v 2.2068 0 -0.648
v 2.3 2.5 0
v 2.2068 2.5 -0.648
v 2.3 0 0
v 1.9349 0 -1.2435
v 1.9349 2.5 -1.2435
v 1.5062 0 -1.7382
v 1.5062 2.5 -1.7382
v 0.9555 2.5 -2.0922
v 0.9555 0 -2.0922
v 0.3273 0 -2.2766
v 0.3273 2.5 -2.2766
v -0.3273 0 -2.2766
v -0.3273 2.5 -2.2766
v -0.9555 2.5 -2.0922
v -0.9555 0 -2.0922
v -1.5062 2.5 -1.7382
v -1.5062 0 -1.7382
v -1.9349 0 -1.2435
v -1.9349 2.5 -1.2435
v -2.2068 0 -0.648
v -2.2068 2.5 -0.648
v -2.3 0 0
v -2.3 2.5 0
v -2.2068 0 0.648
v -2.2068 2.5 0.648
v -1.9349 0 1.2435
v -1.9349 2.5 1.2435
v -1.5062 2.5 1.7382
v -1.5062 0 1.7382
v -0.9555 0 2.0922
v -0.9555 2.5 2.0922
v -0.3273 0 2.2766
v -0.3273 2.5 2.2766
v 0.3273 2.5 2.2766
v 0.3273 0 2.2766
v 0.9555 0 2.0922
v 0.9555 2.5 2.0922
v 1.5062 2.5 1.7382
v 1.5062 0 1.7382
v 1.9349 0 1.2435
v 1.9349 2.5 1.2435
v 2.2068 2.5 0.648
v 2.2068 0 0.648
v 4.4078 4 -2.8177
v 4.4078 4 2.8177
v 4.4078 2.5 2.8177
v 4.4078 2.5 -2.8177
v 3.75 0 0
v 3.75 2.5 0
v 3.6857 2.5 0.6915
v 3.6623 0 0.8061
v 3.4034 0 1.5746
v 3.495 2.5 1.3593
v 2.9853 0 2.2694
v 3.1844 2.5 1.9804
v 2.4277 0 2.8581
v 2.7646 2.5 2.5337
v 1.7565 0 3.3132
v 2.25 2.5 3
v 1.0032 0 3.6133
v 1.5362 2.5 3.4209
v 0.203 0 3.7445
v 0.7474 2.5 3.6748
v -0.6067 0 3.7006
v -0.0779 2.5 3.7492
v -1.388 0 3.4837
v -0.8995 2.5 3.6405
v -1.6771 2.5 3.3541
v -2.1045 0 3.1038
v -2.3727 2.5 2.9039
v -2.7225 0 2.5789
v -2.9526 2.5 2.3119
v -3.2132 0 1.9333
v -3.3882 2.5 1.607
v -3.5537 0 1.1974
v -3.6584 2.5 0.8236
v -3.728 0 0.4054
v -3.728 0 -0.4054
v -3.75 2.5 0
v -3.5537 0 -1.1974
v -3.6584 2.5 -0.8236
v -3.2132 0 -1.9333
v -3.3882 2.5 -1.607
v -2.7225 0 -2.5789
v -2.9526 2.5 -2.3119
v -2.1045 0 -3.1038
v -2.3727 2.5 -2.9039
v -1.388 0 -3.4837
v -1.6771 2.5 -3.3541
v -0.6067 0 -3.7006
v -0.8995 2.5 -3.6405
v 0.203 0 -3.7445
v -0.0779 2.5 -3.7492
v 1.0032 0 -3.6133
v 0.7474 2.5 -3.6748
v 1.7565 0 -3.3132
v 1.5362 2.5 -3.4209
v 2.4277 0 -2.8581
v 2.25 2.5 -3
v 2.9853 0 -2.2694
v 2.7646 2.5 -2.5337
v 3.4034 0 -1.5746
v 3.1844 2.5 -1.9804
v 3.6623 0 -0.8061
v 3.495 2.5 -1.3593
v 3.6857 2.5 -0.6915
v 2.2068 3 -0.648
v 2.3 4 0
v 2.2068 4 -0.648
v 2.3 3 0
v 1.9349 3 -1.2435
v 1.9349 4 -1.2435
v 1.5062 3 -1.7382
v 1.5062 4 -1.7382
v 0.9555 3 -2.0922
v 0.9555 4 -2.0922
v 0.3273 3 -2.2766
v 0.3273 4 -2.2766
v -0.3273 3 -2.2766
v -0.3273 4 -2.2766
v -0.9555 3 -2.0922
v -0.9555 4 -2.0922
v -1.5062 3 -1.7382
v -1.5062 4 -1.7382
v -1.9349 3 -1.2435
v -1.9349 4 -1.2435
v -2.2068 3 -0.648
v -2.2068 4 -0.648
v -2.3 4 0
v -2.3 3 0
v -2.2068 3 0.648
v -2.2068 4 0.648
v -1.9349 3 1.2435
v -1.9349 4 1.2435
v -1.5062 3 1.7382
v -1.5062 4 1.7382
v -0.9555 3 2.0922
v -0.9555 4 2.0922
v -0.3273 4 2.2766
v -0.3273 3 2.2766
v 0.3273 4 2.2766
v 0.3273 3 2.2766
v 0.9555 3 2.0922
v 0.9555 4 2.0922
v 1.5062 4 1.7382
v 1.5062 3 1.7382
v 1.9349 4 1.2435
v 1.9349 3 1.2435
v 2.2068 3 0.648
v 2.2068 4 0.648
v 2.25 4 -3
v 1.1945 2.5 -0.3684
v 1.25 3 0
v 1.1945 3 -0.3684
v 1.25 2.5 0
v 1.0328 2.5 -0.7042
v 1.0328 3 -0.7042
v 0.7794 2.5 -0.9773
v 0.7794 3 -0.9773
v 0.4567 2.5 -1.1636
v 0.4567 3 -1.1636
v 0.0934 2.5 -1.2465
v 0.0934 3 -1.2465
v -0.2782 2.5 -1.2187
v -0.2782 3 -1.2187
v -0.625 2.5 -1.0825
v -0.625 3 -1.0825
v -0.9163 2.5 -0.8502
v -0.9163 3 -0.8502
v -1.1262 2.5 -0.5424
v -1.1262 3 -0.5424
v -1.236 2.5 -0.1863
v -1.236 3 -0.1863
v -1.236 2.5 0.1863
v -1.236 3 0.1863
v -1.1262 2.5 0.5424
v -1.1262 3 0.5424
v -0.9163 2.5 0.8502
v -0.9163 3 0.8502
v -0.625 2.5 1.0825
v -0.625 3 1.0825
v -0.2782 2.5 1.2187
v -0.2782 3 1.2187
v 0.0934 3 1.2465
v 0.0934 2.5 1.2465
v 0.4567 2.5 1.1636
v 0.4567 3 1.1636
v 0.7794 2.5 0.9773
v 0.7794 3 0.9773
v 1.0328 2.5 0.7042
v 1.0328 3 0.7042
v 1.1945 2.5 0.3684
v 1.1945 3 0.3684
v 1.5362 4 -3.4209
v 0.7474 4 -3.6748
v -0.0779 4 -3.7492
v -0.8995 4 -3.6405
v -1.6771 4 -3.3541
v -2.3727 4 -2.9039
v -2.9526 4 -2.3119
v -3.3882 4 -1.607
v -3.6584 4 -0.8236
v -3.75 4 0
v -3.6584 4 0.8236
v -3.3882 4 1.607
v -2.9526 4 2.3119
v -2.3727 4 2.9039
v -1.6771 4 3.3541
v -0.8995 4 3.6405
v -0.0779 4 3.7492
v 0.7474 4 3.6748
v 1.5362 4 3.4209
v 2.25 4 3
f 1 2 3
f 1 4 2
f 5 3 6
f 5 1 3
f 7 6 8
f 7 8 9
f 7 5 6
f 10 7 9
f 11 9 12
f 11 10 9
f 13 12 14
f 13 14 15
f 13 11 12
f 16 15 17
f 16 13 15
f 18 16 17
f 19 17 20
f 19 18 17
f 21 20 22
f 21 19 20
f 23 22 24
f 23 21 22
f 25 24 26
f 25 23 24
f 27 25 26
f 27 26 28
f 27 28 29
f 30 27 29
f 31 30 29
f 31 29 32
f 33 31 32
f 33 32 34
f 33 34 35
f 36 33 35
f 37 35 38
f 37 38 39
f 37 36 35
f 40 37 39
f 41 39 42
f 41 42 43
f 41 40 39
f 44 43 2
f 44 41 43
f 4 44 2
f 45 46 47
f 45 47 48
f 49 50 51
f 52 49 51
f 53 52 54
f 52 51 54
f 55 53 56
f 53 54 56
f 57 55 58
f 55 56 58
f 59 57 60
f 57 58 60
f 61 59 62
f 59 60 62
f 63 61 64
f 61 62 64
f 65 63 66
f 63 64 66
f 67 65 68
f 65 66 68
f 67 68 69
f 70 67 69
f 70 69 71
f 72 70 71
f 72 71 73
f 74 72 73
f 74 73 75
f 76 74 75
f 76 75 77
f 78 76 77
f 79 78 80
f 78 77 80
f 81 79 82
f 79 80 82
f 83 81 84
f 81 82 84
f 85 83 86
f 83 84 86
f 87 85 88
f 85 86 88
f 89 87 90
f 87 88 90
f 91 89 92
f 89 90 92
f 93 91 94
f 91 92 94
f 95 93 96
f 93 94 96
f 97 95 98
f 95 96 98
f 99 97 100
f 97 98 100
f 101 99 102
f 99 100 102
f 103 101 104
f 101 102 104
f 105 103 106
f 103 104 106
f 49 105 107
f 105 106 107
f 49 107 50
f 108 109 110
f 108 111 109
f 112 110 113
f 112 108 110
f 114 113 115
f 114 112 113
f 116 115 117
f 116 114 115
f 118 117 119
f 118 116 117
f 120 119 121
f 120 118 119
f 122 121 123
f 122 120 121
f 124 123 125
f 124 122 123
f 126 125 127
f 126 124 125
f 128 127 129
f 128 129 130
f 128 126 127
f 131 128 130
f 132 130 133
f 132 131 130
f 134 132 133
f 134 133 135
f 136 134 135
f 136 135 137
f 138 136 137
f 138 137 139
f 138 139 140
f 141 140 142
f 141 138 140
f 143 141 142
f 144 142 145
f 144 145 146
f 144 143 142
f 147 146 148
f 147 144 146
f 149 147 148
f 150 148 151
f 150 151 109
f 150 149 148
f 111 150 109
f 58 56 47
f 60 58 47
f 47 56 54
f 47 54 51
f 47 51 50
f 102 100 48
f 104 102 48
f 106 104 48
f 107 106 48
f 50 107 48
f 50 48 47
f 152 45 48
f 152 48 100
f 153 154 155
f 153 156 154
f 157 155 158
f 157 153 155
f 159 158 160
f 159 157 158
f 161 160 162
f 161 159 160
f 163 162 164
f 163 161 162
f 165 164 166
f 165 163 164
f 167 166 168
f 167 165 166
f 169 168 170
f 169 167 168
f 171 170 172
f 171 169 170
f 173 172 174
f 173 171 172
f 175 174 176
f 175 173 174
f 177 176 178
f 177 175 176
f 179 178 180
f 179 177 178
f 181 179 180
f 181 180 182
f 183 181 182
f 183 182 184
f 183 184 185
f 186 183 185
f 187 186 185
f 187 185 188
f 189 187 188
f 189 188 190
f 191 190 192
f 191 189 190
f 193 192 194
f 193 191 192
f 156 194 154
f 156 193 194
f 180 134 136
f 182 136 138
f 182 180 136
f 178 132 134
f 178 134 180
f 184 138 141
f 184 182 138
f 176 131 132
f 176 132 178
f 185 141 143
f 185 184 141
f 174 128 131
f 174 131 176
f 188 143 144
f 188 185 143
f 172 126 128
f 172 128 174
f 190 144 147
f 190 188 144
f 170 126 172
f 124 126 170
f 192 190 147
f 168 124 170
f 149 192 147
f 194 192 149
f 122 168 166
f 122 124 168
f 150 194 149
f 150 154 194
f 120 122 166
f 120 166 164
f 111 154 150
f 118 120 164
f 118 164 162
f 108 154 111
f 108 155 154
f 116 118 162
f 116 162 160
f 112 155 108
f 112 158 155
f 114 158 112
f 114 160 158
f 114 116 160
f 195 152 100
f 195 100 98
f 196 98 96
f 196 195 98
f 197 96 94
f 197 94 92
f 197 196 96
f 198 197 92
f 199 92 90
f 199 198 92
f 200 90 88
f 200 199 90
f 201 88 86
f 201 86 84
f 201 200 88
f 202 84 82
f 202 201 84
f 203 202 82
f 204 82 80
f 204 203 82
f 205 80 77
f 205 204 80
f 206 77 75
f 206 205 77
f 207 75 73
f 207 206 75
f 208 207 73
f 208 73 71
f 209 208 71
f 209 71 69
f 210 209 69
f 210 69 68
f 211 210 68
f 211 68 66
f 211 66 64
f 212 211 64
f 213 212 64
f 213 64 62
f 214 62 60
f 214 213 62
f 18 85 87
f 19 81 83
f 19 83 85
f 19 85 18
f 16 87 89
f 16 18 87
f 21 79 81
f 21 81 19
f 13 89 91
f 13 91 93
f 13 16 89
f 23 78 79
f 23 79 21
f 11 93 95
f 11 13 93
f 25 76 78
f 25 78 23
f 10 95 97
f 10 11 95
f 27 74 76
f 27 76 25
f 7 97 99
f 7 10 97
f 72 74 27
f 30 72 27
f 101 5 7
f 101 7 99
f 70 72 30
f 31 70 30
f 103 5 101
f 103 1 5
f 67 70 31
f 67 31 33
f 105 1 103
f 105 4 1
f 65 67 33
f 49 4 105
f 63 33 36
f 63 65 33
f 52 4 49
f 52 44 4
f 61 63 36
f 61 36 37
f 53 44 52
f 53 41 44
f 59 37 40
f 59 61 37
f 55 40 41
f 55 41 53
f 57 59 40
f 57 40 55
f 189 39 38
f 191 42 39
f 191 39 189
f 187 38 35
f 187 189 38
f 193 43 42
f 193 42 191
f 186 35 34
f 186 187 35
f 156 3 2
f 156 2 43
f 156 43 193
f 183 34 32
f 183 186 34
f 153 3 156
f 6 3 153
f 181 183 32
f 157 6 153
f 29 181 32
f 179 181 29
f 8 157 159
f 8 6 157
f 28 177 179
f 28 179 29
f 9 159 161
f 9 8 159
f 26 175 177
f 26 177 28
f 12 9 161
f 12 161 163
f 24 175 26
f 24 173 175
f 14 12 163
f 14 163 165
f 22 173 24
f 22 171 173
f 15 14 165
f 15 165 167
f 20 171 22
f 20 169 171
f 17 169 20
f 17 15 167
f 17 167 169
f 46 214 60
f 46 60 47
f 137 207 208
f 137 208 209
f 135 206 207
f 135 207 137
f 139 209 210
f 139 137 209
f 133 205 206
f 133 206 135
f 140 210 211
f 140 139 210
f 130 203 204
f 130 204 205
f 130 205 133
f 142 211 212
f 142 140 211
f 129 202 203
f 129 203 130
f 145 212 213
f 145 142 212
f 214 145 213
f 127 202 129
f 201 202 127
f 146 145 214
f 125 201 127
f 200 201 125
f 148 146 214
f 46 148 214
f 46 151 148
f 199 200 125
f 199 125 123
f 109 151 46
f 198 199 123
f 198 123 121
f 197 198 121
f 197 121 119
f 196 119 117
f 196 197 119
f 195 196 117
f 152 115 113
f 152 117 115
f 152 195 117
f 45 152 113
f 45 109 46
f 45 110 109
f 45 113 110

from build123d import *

# Parameters (mm, degrees)
BOSS_EXTRUDE1_DEPTH = 1.5
SKETCH2_R           = 3.75
BOSS_EXTRUDE2_DEPTH = 2.5


with BuildPart() as part:
    # Sketch1 → Boss-Extrude1 (new body)
    with BuildSketch(Plane(origin=(0, 4, 0), x_dir=(1, 0, 0), z_dir=(0, 1, 0))):
        with BuildLine():
            Line((2.25, -3), (4.407767894, -2.817669075))
            Line((4.407767894, -2.817669075), (4.407767894, 2.817669075))
            Line((4.407767894, 2.817669075), (2.25, 3))
            ThreePointArc((2.25, 3), (-3.75, 0), (2.25, -3))
        make_face()
    extrude(amount=-BOSS_EXTRUDE1_DEPTH)

    # Sketch2 → Boss-Extrude2 (add)
    with BuildSketch(Plane.XZ.offset(-2.5)):
        Circle(SKETCH2_R)
    extrude(amount=BOSS_EXTRUDE2_DEPTH)

    # Sketch3 → Cut-Revolve1 (revolve, cut)
    with BuildSketch(Plane(origin=(0, 0, 0), x_dir=(-1, 0, 0), z_dir=(0, 0, -1))):
        Polygon((-2.3, 0), (0, 0), (0, 4), (-2.3, 4), (-2.3, 3), (-1.25, 3), (-1.25, 2.5), (-2.3, 2.5), align=None)
    revolve(axis=Axis((0, 0, 0), (0, 1, 0)), mode=Mode.SUBTRACT)


solid = part.part
